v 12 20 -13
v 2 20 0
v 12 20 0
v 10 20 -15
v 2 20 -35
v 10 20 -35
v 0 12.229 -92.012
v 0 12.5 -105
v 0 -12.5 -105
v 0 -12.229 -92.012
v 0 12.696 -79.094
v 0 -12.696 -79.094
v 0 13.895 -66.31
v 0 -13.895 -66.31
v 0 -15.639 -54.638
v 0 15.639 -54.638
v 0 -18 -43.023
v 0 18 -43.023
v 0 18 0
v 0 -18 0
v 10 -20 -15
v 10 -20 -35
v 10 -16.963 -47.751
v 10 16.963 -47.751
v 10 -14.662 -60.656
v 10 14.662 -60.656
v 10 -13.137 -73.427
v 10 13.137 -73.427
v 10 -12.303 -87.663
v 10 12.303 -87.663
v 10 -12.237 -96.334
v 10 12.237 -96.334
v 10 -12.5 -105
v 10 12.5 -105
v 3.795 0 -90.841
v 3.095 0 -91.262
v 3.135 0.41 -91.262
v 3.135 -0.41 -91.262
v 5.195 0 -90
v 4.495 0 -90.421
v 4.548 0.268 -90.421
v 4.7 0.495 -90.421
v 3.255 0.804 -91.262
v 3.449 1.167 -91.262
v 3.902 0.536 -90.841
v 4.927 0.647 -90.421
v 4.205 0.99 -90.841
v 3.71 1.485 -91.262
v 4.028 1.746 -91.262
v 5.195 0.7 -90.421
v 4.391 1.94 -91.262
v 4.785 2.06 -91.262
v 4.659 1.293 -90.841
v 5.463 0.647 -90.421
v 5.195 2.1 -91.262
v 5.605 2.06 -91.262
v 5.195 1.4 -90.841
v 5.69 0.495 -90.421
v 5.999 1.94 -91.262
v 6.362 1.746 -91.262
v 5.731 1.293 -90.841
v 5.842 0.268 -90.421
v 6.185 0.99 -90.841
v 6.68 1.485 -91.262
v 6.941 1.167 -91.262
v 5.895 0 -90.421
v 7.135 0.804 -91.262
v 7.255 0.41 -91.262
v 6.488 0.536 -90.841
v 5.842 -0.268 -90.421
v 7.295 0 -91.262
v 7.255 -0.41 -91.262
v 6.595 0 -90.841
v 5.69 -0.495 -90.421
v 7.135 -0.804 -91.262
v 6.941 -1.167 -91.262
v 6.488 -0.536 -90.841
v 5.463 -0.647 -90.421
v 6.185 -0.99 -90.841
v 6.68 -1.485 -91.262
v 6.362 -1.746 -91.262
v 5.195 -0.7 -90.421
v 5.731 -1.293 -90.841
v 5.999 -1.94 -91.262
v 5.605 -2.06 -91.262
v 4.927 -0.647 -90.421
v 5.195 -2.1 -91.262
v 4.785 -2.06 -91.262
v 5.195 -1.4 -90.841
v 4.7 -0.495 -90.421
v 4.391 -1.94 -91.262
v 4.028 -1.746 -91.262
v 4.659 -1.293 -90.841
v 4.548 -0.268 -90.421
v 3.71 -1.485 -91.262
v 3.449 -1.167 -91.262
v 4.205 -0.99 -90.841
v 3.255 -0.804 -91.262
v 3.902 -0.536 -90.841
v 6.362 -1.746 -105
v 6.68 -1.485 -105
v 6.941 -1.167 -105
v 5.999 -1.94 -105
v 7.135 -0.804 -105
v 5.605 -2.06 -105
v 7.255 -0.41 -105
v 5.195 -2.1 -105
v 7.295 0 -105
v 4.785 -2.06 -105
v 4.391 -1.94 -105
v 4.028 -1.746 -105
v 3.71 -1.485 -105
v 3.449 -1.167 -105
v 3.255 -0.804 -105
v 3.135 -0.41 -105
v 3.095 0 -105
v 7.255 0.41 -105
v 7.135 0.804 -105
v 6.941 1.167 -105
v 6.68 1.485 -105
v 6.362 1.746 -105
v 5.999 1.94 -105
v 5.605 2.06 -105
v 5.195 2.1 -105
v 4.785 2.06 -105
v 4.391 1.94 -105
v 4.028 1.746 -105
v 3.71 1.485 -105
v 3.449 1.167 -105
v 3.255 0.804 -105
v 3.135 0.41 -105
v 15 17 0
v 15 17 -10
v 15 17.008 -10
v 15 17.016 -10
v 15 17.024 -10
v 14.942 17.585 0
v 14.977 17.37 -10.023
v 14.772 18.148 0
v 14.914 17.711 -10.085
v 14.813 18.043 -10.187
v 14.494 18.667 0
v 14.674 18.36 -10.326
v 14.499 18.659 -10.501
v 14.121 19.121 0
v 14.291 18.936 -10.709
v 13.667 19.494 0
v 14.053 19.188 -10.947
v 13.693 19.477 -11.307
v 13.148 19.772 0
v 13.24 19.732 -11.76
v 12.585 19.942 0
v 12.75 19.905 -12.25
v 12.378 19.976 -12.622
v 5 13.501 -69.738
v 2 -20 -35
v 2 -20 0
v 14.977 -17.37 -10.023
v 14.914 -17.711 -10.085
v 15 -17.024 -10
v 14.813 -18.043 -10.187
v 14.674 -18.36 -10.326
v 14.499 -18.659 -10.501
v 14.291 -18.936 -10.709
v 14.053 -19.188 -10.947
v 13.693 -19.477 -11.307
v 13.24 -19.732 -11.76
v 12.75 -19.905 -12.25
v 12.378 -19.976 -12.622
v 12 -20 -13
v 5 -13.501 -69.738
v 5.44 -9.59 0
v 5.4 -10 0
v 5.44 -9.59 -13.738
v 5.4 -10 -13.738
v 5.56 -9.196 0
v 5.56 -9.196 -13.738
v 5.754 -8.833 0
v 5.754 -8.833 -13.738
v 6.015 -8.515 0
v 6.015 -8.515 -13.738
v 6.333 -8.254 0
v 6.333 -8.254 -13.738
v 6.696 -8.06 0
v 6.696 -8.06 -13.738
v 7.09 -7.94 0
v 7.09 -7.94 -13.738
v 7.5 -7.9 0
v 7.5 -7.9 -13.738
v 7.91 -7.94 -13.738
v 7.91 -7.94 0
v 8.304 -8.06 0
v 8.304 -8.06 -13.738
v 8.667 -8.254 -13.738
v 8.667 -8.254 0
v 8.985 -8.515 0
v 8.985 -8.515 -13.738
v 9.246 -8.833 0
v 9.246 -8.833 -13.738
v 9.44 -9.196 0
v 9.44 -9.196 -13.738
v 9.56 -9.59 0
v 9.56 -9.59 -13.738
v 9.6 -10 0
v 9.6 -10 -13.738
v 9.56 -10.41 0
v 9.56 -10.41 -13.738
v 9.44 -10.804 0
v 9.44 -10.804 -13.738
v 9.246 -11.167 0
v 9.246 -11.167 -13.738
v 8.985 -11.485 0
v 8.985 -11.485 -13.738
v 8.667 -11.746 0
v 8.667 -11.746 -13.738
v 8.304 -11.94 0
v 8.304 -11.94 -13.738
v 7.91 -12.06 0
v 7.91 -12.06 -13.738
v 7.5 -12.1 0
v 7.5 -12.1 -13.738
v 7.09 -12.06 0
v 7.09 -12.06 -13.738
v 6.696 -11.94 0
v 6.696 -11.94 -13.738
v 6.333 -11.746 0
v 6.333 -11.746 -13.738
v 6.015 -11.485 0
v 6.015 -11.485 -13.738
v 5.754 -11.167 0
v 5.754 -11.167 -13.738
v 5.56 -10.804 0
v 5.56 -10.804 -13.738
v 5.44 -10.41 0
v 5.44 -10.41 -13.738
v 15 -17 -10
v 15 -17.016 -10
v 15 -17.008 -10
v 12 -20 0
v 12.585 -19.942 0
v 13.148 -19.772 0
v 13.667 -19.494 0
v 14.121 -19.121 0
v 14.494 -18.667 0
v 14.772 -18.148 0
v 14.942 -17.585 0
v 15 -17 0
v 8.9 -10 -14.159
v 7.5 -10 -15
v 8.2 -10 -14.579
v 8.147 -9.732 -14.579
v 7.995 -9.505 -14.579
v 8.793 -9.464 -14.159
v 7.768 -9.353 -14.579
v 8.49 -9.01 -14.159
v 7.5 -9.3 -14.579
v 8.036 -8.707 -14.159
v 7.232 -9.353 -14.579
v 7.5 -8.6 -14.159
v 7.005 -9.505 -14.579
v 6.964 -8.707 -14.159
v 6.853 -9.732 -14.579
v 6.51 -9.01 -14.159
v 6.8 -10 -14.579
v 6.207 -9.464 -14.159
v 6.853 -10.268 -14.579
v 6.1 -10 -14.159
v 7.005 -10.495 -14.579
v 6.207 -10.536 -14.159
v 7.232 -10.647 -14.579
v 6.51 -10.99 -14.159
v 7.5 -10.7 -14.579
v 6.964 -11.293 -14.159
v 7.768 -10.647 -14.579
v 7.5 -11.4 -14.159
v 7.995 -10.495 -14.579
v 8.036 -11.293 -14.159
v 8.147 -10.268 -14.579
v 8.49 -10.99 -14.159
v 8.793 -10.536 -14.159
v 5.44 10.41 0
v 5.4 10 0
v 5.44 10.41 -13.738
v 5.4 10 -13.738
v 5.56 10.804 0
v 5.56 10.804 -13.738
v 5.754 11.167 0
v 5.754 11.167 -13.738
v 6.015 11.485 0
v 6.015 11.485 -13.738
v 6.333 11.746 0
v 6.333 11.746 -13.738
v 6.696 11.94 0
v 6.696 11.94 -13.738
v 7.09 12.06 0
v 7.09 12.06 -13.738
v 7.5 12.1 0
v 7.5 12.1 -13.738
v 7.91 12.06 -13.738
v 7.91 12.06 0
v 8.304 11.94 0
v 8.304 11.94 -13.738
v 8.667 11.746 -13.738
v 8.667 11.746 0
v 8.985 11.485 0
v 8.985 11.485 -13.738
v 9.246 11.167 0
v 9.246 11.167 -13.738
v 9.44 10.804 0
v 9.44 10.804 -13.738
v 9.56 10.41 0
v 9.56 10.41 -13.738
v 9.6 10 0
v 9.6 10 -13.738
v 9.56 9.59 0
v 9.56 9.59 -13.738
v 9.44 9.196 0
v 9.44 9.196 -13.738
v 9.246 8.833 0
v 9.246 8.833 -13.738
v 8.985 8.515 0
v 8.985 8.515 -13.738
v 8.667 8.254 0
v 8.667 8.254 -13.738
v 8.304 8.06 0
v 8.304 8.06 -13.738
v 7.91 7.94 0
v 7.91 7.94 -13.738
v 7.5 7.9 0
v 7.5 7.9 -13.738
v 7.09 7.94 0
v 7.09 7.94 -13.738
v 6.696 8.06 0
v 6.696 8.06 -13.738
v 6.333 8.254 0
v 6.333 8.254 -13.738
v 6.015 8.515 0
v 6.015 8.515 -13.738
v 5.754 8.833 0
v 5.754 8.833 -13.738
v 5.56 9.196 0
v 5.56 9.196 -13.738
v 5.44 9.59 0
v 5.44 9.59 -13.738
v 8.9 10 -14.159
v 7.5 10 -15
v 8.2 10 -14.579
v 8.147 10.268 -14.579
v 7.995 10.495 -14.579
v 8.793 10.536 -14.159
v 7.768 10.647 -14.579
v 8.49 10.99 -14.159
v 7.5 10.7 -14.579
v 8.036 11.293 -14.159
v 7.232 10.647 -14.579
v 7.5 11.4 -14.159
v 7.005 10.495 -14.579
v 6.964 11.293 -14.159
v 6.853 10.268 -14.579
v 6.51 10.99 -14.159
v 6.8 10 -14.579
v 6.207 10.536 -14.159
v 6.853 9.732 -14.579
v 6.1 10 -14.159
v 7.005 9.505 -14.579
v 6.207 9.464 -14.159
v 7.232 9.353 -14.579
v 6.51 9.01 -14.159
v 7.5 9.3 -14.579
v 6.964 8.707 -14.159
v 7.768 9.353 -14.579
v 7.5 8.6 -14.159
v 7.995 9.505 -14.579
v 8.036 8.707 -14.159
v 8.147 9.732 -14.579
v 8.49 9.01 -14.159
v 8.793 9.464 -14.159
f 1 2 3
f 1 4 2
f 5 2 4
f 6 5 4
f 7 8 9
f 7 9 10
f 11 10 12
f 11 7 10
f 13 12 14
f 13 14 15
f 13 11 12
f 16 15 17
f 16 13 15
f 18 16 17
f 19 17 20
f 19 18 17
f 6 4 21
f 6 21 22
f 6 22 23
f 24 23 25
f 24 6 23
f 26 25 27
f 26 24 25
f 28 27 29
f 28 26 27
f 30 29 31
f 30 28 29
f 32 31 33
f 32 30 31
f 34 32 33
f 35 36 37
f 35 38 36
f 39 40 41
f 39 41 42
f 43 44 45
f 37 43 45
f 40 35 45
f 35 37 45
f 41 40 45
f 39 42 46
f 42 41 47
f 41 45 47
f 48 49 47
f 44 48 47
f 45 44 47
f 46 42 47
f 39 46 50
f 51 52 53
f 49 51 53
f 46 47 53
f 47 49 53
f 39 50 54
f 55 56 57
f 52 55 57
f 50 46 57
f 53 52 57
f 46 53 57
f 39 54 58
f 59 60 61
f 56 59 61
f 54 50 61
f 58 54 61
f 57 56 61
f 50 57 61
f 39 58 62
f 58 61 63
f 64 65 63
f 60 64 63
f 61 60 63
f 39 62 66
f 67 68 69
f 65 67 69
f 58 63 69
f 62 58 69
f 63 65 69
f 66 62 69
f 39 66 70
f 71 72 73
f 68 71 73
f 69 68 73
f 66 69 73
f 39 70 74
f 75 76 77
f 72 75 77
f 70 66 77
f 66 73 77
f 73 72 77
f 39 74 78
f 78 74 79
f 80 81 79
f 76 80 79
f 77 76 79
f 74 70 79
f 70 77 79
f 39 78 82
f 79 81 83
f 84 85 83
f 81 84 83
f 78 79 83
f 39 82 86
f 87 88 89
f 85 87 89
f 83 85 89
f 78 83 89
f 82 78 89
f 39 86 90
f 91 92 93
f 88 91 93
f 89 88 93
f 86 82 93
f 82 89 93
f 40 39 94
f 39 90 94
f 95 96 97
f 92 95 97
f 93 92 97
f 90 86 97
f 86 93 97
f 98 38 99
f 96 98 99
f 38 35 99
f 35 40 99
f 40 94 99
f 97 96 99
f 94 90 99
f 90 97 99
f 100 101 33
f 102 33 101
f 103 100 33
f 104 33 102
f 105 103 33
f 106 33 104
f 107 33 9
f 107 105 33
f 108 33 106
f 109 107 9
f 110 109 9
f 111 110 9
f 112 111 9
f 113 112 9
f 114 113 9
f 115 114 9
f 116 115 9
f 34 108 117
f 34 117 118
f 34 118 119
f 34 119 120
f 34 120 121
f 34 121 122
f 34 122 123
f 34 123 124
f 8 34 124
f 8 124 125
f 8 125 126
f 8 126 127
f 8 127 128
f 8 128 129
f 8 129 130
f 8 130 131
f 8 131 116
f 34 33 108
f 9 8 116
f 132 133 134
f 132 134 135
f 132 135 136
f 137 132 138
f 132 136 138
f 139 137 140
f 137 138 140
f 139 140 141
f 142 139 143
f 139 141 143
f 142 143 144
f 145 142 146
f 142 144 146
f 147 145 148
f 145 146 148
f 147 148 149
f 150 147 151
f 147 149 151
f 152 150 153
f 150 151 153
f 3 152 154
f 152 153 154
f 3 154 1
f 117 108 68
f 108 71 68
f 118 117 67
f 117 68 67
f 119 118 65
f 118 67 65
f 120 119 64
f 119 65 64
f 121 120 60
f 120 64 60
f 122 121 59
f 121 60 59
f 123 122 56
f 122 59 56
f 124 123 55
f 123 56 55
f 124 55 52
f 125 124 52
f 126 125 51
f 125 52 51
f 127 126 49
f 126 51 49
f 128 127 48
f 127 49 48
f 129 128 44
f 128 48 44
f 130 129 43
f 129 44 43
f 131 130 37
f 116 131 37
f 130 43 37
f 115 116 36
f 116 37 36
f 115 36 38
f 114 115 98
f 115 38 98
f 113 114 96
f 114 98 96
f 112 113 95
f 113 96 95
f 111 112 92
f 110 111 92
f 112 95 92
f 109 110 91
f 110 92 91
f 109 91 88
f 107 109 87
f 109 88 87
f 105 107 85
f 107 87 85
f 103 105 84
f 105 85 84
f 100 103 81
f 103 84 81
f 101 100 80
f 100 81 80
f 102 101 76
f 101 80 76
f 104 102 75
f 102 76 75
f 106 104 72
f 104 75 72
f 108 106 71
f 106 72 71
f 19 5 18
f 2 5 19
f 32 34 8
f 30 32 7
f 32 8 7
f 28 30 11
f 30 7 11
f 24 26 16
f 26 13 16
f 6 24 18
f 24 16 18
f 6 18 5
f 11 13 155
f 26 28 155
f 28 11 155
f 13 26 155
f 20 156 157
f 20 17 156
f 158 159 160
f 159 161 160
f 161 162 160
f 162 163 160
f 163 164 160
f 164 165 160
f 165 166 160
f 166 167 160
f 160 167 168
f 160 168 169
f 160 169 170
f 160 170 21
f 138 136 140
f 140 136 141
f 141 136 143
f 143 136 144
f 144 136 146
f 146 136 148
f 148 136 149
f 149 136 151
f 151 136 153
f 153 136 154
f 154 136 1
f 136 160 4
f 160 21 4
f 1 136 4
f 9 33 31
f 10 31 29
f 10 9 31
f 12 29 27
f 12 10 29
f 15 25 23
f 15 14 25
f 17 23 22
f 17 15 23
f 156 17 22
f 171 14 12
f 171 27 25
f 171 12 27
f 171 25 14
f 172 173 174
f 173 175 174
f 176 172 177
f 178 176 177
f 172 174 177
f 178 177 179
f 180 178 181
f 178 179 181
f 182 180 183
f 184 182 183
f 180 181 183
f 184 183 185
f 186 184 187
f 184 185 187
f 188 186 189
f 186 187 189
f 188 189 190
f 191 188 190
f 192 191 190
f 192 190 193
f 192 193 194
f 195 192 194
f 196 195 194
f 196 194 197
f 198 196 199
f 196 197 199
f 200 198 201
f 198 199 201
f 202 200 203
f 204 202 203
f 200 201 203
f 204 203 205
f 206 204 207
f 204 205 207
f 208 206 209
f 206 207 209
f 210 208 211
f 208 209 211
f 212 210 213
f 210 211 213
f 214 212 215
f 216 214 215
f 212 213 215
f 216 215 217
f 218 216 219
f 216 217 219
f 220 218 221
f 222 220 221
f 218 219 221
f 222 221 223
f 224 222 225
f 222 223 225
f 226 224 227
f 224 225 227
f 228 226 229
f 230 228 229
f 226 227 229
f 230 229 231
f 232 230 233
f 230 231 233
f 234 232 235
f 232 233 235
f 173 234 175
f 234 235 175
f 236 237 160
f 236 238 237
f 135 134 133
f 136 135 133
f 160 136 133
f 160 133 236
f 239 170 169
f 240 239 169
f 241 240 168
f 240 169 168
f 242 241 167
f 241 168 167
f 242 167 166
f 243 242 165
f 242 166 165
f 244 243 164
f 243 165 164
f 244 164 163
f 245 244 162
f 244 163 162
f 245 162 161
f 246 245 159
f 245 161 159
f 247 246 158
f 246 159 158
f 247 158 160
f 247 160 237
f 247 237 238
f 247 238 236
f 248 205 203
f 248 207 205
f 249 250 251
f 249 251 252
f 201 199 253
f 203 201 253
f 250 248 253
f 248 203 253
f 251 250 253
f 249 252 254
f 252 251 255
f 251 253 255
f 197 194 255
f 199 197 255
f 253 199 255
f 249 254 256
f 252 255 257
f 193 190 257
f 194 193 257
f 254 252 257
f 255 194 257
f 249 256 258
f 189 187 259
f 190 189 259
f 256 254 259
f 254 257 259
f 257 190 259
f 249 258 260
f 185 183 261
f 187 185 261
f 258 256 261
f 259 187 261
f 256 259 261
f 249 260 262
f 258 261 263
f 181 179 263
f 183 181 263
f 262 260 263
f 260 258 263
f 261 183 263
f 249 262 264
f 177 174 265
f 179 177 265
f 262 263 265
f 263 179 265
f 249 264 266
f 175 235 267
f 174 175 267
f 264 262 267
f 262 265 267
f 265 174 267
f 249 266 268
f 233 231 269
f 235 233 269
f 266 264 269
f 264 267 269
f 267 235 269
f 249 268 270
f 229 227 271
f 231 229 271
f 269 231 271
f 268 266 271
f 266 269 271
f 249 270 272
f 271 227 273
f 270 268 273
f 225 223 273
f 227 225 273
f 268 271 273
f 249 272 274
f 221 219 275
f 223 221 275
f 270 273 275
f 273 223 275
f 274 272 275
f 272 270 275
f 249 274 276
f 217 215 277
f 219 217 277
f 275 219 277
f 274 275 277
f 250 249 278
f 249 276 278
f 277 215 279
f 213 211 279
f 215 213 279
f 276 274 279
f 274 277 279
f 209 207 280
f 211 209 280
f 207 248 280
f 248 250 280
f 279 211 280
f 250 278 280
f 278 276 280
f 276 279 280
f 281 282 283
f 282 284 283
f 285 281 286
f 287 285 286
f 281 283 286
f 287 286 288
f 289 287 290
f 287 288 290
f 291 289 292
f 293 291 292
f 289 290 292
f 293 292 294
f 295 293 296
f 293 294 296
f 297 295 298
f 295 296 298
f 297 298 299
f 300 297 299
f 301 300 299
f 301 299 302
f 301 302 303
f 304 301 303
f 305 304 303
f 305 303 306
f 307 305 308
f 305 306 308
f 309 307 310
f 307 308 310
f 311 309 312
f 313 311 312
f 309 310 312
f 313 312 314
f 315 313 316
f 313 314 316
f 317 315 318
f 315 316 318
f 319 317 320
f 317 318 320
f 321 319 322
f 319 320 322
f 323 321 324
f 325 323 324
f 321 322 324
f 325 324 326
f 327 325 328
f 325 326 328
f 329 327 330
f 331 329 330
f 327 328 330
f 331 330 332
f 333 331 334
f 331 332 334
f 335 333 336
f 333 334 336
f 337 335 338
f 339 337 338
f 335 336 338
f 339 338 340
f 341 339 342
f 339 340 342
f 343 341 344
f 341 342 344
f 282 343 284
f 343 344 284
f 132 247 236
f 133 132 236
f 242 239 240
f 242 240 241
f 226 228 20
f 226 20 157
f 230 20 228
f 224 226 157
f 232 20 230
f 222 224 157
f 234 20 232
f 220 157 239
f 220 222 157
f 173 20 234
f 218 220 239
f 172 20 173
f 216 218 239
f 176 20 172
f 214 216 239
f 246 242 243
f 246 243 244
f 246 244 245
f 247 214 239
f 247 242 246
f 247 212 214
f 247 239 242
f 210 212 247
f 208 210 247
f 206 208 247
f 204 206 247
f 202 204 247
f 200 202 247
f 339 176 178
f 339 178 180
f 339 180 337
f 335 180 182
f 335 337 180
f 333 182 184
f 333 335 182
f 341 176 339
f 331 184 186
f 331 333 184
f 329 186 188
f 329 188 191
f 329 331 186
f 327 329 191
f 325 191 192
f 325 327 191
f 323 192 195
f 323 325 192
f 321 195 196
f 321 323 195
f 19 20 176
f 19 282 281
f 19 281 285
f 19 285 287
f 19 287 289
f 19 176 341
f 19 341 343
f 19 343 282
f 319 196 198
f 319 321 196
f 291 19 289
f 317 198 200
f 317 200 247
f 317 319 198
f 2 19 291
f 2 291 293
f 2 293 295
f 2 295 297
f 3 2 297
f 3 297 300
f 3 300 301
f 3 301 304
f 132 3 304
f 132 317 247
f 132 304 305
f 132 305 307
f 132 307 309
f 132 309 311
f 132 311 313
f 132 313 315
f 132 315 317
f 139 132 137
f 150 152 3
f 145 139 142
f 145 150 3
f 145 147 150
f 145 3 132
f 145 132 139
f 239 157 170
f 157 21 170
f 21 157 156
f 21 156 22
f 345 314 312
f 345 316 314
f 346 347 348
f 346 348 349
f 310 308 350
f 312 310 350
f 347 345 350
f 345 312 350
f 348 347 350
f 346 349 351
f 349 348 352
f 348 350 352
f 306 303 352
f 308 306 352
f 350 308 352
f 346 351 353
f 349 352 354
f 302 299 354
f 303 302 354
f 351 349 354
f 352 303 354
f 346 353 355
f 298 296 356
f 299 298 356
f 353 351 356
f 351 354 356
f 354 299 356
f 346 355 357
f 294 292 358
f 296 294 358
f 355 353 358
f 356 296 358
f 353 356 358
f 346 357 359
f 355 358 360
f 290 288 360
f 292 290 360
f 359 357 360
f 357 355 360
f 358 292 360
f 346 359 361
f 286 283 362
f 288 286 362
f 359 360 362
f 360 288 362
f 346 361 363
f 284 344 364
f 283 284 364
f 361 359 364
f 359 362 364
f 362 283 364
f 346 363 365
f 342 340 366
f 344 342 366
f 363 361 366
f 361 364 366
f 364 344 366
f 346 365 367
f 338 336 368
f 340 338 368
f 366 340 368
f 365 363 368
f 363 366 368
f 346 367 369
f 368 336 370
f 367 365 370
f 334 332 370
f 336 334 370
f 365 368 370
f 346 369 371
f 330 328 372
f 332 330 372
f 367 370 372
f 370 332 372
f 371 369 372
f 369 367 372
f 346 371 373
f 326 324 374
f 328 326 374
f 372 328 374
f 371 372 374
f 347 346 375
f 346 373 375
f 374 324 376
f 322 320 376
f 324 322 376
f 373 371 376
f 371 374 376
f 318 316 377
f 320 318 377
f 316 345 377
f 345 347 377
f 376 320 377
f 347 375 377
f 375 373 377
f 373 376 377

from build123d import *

# Parameters (mm, degrees)
BOSS_EXTRUDE1_DEPTH   = 20
CUT_EXTRUDE1_DEPTH    = 108.935165725
FILLET2_R             = 3
M5_TAPPED_HOLE1_D     = 4.2
M5_TAPPED_HOLE1_DEPTH = 13.7381927
M5_TAPPED_HOLE1_TIP   = 1.2618073
M5_TAPPED_HOLE2_D     = 4.2
M5_TAPPED_HOLE2_DEPTH = 13.7381927
M5_TAPPED_HOLE2_TIP   = 1.2618073
CHAMFER1_SIZE         = 5
CHAMFER2_SIZE         = 2


with BuildPart() as part:
    # Sketch1 → Boss-Extrude1 (new, symmetric)
    with BuildSketch(Plane(origin=(0, 0, 0), x_dir=(1, 0, 0), z_dir=(0, 1, 0))):
        Polygon((0, 0), (15, 0), (15, 10), (10, 10), (10, 105), (0, 105), align=None)
    extrude(amount=BOSS_EXTRUDE1_DEPTH, both=True)

    # Sketch3 → Cut-Extrude1 (cut, through all)
    with BuildSketch(Plane.ZY):
        with BuildLine():
            Line((-35, -20), (-105, -20))
            Line((-105, -20), (-105, -12.5))
            add(Edge.make_bspline(
                [(-105, -12.5), (-69.476387912, -10.752287941), (-35, -20)],
                knots=[0, 0, 0, 1, 1, 1], degree=2))
        make_face()
    cut_extrude1 = extrude(amount=-CUT_EXTRUDE1_DEPTH, mode=Mode.SUBTRACT)

    # Mirror1: Cut-Extrude1 across plane
    add(cut_extrude1.mirror(Plane.ZX), mode=Mode.SUBTRACT)

    # Fillet2
    fillet2_edges = [part.edges().sort_by_distance(p)[0] for p in [
        (15, 20, -5),
        (15, -20, -5),
    ]]
    fillet(fillet2_edges, radius=FILLET2_R)

    # M5 Tapped Hole1
    with Locations(Plane(origin=(0, 0, -105), x_dir=(-1, 0, 0), z_dir=(0, 0, -1))):
        with Locations((-5.195, 0)):
            Hole(M5_TAPPED_HOLE1_D / 2, depth=M5_TAPPED_HOLE1_DEPTH)
            with Locations((0, 0, -(M5_TAPPED_HOLE1_DEPTH + M5_TAPPED_HOLE1_TIP / 2))):  # 118° drill point
                Cone(0, M5_TAPPED_HOLE1_D / 2, M5_TAPPED_HOLE1_TIP, mode=Mode.SUBTRACT)

    # M5 Tapped Hole2
    with Locations(Plane.XY):
        with Locations((7.5, -10), (7.5, 10)):
            Hole(M5_TAPPED_HOLE2_D / 2, depth=M5_TAPPED_HOLE2_DEPTH)
            with Locations((0, 0, -(M5_TAPPED_HOLE2_DEPTH + M5_TAPPED_HOLE2_TIP / 2))):  # 118° drill point
                Cone(0, M5_TAPPED_HOLE2_D / 2, M5_TAPPED_HOLE2_TIP, mode=Mode.SUBTRACT)

    # Chamfer1
    chamfer1_edges = [part.edges().sort_by_distance(p)[0] for p in [
        (10, 0, -10),
    ]]
    chamfer(chamfer1_edges, length=CHAMFER1_SIZE - 0.0001)  # a hair under: the kernel refuses the full size

    # Chamfer2
    chamfer2_edges = [part.edges().sort_by_distance(p)[0] for p in [
        (0, -20, -17.5),
        (0, 20, -17.5),
    ]]
    chamfer(chamfer2_edges, length=CHAMFER2_SIZE)


solid = part.part
